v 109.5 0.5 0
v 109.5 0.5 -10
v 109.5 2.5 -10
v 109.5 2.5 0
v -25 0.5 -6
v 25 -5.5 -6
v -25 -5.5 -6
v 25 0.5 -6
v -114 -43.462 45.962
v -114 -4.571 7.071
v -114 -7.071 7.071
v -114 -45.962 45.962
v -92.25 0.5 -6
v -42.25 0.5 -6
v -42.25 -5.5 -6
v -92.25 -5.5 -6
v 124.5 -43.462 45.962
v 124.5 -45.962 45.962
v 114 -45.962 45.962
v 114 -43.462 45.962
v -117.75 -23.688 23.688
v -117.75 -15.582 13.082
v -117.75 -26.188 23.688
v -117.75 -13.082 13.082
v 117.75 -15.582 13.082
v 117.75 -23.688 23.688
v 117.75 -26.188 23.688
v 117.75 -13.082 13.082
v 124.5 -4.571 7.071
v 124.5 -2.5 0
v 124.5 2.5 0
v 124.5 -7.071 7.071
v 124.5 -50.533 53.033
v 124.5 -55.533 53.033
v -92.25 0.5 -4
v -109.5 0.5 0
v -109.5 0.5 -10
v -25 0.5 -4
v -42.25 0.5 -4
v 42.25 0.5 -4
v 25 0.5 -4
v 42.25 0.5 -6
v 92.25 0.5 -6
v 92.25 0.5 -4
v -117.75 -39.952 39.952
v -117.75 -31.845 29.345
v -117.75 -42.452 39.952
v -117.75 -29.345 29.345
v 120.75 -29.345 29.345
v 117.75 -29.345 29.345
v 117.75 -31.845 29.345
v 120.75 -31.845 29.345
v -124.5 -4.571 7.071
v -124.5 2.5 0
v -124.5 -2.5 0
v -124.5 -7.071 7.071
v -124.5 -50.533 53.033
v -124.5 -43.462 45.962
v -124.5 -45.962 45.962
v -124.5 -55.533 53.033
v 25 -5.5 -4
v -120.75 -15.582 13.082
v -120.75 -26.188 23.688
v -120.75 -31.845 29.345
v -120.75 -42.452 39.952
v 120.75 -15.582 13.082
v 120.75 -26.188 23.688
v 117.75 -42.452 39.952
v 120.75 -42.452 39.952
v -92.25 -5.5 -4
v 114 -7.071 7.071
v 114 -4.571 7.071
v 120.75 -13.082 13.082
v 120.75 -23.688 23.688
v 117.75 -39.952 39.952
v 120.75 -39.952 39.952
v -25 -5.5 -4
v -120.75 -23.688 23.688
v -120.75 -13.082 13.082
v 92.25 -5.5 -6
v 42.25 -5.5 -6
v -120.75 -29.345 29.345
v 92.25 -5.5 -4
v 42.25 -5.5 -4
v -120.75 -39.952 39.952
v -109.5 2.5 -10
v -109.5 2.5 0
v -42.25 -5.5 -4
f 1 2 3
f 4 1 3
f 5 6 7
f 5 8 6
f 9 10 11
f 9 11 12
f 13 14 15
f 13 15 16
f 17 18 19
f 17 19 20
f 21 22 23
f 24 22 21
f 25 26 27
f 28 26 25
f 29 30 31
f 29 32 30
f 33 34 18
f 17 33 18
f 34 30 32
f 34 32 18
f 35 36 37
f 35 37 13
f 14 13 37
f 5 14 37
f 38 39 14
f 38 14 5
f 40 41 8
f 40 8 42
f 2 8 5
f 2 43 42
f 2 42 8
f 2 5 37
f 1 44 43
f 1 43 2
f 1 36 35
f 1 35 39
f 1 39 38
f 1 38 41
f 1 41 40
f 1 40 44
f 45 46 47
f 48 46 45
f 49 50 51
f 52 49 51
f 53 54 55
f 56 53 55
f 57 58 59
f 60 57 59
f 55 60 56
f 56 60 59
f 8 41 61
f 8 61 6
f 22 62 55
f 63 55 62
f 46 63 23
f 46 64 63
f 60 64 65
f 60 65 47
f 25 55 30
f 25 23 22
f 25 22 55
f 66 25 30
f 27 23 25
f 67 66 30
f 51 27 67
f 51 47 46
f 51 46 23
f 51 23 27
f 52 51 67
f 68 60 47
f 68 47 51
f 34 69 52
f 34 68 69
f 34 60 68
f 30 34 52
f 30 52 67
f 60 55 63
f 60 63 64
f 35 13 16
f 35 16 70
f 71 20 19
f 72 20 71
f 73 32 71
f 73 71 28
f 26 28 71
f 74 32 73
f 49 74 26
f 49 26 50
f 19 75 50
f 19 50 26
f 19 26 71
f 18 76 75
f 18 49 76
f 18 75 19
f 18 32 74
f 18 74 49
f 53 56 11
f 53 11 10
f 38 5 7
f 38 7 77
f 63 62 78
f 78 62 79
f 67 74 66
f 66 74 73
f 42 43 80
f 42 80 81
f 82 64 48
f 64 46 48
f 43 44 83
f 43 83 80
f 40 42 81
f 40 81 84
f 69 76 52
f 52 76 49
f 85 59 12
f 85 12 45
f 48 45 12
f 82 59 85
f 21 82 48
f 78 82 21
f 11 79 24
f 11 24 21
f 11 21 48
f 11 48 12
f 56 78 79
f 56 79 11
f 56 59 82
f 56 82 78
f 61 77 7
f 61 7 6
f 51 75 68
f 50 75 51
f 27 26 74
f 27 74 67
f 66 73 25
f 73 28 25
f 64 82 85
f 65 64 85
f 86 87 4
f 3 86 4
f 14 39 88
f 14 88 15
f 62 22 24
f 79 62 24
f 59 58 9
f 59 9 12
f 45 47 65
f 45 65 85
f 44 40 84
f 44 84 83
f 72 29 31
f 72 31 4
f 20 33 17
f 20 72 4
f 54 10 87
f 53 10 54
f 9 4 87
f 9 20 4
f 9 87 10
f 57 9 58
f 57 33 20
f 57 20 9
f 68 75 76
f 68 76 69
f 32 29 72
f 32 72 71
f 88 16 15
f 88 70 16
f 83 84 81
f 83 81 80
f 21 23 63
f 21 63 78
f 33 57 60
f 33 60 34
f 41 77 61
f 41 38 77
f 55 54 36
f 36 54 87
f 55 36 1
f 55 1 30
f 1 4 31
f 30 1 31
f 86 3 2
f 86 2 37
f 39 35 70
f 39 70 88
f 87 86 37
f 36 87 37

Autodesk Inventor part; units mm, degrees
ref_plane "YZ Plane" through (0, 0, 0) normal (1, 0, 0) x (0, 1, 0)
ref_plane "XZ Plane" through (0, 0, 0) normal (0, 1, 0) x (-1, 0, 0)
sketch "Sketch2" plane through (0, 0, 0) normal (0, 0, 1) x (1, 0, 0)
  line L0 (-124.5, 2.5) -> (124.5, 2.5)
  line L1 (124.5, 2.5) -> (124.5, -2.5)
  line L2 (124.5, -2.5) -> (-124.5, -2.5)
  line L3 (-124.5, -2.5) -> (-124.5, 2.5)
  point P0 (0, 0)
  dimension "d1" = 249
  dimension "d2" = 5
  dimension "d3" = 2.5
  dimension "d4" = 124.5
sketch "Sketch3" plane through (0, 0, 0) normal (1, 0, 0) x (0, 1, 0)
  line L0 (0, 0) -> (-53.033, 53.033)
  line L1 (0, -0.5221) -> (1.6531, -0.5221)
  dimension "d5" = 75
  dimension "d6" = 45
sweep "Sweep1" add profiles "Sketch2" path "Sketch3" path curves L0
sketch "Sketch10" plane through (124.5, 2.5, 0) normal (0, 0, -1) x (-1, 0, 0)
  line L0 (249, 0) -> (0, 0) projected
  line L1 (0, 0) -> (0, -5) projected
  line L2 (0, -5) -> (249, -5) projected
  line L3 (249, -5) -> (249, 0) projected
  line L4 (15, 0) -> (234, 0)
  line L5 (234, 0) -> (234, -2)
  line L6 (234, -2) -> (15, -2)
  line L7 (15, -2) -> (15, 0)
  point P0 (124.5, -2.5)
  dimension "d76" = 2
  dimension "d77" = 219
  dimension "d78" = 109.5
extrude "Extrusion5" add sketch "Sketch10" along normal blind 10 contours L5 L6 L7 L0
sketch "Sketch11" plane through (-109.5, 0.5, 0) normal (0, -1, 0) x (1, 0, 0)
  line L0 (0, 0) -> (219, 0) projected
  line L1 (0, 0) -> (0, -10) projected
  line L2 (219, -10) -> (0, -10) projected
  line L3 (219, 0) -> (219, -10) projected
  line L4 (201.75, -6) -> (151.75, -6)
  line L5 (151.75, -6) -> (151.75, -4)
  line L6 (151.75, -4) -> (201.75, -4)
  line L7 (201.75, -4) -> (201.75, -6)
  line L8 (134.5, -6) -> (84.5, -6)
  line L9 (84.5, -6) -> (84.5, -4)
  line L10 (84.5, -4) -> (134.5, -4)
  line L11 (134.5, -4) -> (134.5, -6)
  line L12 (67.25, -6) -> (17.25, -6)
  line L13 (17.25, -6) -> (17.25, -4)
  line L14 (17.25, -4) -> (67.25, -4)
  line L15 (67.25, -4) -> (67.25, -6)
  point P0 (109.5, 0)
  dimension "d81" = 50
  dimension "d82" = 2
  dimension "d83" = 10
  dimension "d84" = 219
  dimension "d85" = 4
  dimension "d86" = 50
  dimension "d87" = 50
  dimension "d88" = 17.25
  dimension "d89" = 17.25
  dimension "d90" = 17.25
  dimension "d91" = 17.25
extrude "Extrusion6" add sketch "Sketch11" along normal blind 6 contours L4 L5 L6 L7 | L8 L9 L10 L11 | L12 L13 L14 L15
sketch "Sketch13" plane through (124.5, -2.5, 0) normal (1, 0, 0) x (0, 0, -1)
  line L0 (0, 5) -> (0, 0) projected
  line L1 (0, 5) -> (-53.033, -48.033) projected
  line L2 (-53.033, -53.033) -> (-53.033, -48.033) projected
  line L3 (0, 0) -> (-53.033, -53.033) projected
  line L4 (-7.0711, -2.0711) -> (-7.0711, -4.5711)
  line L5 (-7.0711, -4.5711) -> (-45.9619, -43.4619)
  line L6 (-45.9619, -43.4619) -> (-45.9619, -40.9619)
  line L7 (-7.0711, -3.3211) -> (0, 3.75)
  line L8 (-45.9619, -42.2119) -> (-53.033, -49.283)
  point P0 (0, 2.5)
  dimension "d98" = 2.5
  dimension "d99" = 10
  dimension "d101" = 2.5
  dimension "d102" = 10
  dimension "d103" = 45
extrude "Extrusion7" cut sketch "Sketch13" against normal blind 10.5 contours L4 L5 L6 L1
ref_plane "Work Plane1" through (119.25, -2.5, 0) normal (1, 0, 0) x (0, 0, -1)
sketch "Sketch14" plane through (119.25, -2.5, 0) normal (1, 0, 0) x (0, 0, -1)
  line L0 (-7.0711, -2.0711) -> (-7.0711, -4.5711) projected
  line L1 (-7.0711, -4.5711) -> (-45.9619, -43.4619) projected
  line L2 (-45.9619, -43.4619) -> (-45.9619, -40.9619) projected
  line L3 (-45.9619, -40.9619) -> (-53.033, -48.033) projected
  line L4 (-53.033, -53.033) -> (-53.033, -48.033) projected
  line L5 (0, 0) -> (-53.033, -53.033) projected
  line L6 (0, 5) -> (0, 0) projected
  line L7 (0, 5) -> (-7.0711, -2.0711) projected
  line L8 (-45.9619, -40.9619) -> (-7.0711, -2.0711) projected
  line L9 (-45.9619, -43.4619) -> (-45.9619, -40.9619) projected
  line L10 (-7.0711, -4.5711) -> (-45.9619, -43.4619) projected
  line L11 (-7.0711, -2.0711) -> (-7.0711, -4.5711) projected
  line L12 (-13.0815, -10.5815) -> (-13.0815, -13.0815)
  line L13 (-23.6881, -21.1881) -> (-23.6881, -23.6881)
  line L14 (-29.3449, -26.8449) -> (-29.3449, -29.3449)
  line L15 (-39.9515, -37.4515) -> (-39.9515, -39.9515)
  line L16 (-23.6881, -21.1881) -> (-13.0815, -10.5815)
  line L17 (-13.0815, -13.0815) -> (-23.6881, -23.6881)
  line L18 (-29.3449, -26.8449) -> (-39.9515, -37.4515)
  line L19 (-29.3449, -29.3449) -> (-39.9515, -39.9515)
  line L20 (-39.9515, -39.9515) -> (-39.9515, -37.4515)
  line L21 (-39.9515, -37.4515) -> (-29.3449, -26.8449)
  line L22 (-29.3449, -26.8449) -> (-29.3449, -29.3449)
  line L23 (-29.3449, -29.3449) -> (-39.9515, -39.9515)
  line L24 (-23.6881, -21.1881) -> (-13.0815, -10.5815)
  line L25 (-13.0815, -10.5815) -> (-13.0815, -13.0815)
  line L26 (-13.0815, -13.0815) -> (-23.6881, -23.6881)
  line L27 (-23.6881, -23.6881) -> (-23.6881, -21.1881)
  point P0 (0, 2.5)
  dimension "d106" = 15
  dimension "d107" = 15
  dimension "d109" = 55
  dimension "d110" = 8.5
  dimension "d111" = 8.5
  dimension "d112" = 8
extrude "Extrusion8" cut sketch "Sketch14" along normal mid plane 3 contours L12 L5 L13 L1 | L1 L14 L5 L15
mirror "Mirror2" about plane through (0, 0, 0) normal (1, 0, 0) of "Extrusion8", "Extrusion7"
ref_plane "Work Plane2" through (-119.25, -2.5, 0) normal (1, 0, 0) x (0, 0, -1)
equation "\"d3\" = 0.5 * d2"
equation "\"d4\" = 0.5 * d1"
equation "\"d78\" = 0.5 * d77"
equation "\"d85\" = -0.5 * d82 + 0.5 * d83"
equation "\"d86\" = d81"
equation "\"d87\" = d81"
equation "\"d88\" = -0.75 * d81 + 0.25 * d84"
equation "\"d89\" = d88"
equation "\"d90\" = d88"
equation "\"d111\" = d110"
properties part number "Roof Length Extension"
